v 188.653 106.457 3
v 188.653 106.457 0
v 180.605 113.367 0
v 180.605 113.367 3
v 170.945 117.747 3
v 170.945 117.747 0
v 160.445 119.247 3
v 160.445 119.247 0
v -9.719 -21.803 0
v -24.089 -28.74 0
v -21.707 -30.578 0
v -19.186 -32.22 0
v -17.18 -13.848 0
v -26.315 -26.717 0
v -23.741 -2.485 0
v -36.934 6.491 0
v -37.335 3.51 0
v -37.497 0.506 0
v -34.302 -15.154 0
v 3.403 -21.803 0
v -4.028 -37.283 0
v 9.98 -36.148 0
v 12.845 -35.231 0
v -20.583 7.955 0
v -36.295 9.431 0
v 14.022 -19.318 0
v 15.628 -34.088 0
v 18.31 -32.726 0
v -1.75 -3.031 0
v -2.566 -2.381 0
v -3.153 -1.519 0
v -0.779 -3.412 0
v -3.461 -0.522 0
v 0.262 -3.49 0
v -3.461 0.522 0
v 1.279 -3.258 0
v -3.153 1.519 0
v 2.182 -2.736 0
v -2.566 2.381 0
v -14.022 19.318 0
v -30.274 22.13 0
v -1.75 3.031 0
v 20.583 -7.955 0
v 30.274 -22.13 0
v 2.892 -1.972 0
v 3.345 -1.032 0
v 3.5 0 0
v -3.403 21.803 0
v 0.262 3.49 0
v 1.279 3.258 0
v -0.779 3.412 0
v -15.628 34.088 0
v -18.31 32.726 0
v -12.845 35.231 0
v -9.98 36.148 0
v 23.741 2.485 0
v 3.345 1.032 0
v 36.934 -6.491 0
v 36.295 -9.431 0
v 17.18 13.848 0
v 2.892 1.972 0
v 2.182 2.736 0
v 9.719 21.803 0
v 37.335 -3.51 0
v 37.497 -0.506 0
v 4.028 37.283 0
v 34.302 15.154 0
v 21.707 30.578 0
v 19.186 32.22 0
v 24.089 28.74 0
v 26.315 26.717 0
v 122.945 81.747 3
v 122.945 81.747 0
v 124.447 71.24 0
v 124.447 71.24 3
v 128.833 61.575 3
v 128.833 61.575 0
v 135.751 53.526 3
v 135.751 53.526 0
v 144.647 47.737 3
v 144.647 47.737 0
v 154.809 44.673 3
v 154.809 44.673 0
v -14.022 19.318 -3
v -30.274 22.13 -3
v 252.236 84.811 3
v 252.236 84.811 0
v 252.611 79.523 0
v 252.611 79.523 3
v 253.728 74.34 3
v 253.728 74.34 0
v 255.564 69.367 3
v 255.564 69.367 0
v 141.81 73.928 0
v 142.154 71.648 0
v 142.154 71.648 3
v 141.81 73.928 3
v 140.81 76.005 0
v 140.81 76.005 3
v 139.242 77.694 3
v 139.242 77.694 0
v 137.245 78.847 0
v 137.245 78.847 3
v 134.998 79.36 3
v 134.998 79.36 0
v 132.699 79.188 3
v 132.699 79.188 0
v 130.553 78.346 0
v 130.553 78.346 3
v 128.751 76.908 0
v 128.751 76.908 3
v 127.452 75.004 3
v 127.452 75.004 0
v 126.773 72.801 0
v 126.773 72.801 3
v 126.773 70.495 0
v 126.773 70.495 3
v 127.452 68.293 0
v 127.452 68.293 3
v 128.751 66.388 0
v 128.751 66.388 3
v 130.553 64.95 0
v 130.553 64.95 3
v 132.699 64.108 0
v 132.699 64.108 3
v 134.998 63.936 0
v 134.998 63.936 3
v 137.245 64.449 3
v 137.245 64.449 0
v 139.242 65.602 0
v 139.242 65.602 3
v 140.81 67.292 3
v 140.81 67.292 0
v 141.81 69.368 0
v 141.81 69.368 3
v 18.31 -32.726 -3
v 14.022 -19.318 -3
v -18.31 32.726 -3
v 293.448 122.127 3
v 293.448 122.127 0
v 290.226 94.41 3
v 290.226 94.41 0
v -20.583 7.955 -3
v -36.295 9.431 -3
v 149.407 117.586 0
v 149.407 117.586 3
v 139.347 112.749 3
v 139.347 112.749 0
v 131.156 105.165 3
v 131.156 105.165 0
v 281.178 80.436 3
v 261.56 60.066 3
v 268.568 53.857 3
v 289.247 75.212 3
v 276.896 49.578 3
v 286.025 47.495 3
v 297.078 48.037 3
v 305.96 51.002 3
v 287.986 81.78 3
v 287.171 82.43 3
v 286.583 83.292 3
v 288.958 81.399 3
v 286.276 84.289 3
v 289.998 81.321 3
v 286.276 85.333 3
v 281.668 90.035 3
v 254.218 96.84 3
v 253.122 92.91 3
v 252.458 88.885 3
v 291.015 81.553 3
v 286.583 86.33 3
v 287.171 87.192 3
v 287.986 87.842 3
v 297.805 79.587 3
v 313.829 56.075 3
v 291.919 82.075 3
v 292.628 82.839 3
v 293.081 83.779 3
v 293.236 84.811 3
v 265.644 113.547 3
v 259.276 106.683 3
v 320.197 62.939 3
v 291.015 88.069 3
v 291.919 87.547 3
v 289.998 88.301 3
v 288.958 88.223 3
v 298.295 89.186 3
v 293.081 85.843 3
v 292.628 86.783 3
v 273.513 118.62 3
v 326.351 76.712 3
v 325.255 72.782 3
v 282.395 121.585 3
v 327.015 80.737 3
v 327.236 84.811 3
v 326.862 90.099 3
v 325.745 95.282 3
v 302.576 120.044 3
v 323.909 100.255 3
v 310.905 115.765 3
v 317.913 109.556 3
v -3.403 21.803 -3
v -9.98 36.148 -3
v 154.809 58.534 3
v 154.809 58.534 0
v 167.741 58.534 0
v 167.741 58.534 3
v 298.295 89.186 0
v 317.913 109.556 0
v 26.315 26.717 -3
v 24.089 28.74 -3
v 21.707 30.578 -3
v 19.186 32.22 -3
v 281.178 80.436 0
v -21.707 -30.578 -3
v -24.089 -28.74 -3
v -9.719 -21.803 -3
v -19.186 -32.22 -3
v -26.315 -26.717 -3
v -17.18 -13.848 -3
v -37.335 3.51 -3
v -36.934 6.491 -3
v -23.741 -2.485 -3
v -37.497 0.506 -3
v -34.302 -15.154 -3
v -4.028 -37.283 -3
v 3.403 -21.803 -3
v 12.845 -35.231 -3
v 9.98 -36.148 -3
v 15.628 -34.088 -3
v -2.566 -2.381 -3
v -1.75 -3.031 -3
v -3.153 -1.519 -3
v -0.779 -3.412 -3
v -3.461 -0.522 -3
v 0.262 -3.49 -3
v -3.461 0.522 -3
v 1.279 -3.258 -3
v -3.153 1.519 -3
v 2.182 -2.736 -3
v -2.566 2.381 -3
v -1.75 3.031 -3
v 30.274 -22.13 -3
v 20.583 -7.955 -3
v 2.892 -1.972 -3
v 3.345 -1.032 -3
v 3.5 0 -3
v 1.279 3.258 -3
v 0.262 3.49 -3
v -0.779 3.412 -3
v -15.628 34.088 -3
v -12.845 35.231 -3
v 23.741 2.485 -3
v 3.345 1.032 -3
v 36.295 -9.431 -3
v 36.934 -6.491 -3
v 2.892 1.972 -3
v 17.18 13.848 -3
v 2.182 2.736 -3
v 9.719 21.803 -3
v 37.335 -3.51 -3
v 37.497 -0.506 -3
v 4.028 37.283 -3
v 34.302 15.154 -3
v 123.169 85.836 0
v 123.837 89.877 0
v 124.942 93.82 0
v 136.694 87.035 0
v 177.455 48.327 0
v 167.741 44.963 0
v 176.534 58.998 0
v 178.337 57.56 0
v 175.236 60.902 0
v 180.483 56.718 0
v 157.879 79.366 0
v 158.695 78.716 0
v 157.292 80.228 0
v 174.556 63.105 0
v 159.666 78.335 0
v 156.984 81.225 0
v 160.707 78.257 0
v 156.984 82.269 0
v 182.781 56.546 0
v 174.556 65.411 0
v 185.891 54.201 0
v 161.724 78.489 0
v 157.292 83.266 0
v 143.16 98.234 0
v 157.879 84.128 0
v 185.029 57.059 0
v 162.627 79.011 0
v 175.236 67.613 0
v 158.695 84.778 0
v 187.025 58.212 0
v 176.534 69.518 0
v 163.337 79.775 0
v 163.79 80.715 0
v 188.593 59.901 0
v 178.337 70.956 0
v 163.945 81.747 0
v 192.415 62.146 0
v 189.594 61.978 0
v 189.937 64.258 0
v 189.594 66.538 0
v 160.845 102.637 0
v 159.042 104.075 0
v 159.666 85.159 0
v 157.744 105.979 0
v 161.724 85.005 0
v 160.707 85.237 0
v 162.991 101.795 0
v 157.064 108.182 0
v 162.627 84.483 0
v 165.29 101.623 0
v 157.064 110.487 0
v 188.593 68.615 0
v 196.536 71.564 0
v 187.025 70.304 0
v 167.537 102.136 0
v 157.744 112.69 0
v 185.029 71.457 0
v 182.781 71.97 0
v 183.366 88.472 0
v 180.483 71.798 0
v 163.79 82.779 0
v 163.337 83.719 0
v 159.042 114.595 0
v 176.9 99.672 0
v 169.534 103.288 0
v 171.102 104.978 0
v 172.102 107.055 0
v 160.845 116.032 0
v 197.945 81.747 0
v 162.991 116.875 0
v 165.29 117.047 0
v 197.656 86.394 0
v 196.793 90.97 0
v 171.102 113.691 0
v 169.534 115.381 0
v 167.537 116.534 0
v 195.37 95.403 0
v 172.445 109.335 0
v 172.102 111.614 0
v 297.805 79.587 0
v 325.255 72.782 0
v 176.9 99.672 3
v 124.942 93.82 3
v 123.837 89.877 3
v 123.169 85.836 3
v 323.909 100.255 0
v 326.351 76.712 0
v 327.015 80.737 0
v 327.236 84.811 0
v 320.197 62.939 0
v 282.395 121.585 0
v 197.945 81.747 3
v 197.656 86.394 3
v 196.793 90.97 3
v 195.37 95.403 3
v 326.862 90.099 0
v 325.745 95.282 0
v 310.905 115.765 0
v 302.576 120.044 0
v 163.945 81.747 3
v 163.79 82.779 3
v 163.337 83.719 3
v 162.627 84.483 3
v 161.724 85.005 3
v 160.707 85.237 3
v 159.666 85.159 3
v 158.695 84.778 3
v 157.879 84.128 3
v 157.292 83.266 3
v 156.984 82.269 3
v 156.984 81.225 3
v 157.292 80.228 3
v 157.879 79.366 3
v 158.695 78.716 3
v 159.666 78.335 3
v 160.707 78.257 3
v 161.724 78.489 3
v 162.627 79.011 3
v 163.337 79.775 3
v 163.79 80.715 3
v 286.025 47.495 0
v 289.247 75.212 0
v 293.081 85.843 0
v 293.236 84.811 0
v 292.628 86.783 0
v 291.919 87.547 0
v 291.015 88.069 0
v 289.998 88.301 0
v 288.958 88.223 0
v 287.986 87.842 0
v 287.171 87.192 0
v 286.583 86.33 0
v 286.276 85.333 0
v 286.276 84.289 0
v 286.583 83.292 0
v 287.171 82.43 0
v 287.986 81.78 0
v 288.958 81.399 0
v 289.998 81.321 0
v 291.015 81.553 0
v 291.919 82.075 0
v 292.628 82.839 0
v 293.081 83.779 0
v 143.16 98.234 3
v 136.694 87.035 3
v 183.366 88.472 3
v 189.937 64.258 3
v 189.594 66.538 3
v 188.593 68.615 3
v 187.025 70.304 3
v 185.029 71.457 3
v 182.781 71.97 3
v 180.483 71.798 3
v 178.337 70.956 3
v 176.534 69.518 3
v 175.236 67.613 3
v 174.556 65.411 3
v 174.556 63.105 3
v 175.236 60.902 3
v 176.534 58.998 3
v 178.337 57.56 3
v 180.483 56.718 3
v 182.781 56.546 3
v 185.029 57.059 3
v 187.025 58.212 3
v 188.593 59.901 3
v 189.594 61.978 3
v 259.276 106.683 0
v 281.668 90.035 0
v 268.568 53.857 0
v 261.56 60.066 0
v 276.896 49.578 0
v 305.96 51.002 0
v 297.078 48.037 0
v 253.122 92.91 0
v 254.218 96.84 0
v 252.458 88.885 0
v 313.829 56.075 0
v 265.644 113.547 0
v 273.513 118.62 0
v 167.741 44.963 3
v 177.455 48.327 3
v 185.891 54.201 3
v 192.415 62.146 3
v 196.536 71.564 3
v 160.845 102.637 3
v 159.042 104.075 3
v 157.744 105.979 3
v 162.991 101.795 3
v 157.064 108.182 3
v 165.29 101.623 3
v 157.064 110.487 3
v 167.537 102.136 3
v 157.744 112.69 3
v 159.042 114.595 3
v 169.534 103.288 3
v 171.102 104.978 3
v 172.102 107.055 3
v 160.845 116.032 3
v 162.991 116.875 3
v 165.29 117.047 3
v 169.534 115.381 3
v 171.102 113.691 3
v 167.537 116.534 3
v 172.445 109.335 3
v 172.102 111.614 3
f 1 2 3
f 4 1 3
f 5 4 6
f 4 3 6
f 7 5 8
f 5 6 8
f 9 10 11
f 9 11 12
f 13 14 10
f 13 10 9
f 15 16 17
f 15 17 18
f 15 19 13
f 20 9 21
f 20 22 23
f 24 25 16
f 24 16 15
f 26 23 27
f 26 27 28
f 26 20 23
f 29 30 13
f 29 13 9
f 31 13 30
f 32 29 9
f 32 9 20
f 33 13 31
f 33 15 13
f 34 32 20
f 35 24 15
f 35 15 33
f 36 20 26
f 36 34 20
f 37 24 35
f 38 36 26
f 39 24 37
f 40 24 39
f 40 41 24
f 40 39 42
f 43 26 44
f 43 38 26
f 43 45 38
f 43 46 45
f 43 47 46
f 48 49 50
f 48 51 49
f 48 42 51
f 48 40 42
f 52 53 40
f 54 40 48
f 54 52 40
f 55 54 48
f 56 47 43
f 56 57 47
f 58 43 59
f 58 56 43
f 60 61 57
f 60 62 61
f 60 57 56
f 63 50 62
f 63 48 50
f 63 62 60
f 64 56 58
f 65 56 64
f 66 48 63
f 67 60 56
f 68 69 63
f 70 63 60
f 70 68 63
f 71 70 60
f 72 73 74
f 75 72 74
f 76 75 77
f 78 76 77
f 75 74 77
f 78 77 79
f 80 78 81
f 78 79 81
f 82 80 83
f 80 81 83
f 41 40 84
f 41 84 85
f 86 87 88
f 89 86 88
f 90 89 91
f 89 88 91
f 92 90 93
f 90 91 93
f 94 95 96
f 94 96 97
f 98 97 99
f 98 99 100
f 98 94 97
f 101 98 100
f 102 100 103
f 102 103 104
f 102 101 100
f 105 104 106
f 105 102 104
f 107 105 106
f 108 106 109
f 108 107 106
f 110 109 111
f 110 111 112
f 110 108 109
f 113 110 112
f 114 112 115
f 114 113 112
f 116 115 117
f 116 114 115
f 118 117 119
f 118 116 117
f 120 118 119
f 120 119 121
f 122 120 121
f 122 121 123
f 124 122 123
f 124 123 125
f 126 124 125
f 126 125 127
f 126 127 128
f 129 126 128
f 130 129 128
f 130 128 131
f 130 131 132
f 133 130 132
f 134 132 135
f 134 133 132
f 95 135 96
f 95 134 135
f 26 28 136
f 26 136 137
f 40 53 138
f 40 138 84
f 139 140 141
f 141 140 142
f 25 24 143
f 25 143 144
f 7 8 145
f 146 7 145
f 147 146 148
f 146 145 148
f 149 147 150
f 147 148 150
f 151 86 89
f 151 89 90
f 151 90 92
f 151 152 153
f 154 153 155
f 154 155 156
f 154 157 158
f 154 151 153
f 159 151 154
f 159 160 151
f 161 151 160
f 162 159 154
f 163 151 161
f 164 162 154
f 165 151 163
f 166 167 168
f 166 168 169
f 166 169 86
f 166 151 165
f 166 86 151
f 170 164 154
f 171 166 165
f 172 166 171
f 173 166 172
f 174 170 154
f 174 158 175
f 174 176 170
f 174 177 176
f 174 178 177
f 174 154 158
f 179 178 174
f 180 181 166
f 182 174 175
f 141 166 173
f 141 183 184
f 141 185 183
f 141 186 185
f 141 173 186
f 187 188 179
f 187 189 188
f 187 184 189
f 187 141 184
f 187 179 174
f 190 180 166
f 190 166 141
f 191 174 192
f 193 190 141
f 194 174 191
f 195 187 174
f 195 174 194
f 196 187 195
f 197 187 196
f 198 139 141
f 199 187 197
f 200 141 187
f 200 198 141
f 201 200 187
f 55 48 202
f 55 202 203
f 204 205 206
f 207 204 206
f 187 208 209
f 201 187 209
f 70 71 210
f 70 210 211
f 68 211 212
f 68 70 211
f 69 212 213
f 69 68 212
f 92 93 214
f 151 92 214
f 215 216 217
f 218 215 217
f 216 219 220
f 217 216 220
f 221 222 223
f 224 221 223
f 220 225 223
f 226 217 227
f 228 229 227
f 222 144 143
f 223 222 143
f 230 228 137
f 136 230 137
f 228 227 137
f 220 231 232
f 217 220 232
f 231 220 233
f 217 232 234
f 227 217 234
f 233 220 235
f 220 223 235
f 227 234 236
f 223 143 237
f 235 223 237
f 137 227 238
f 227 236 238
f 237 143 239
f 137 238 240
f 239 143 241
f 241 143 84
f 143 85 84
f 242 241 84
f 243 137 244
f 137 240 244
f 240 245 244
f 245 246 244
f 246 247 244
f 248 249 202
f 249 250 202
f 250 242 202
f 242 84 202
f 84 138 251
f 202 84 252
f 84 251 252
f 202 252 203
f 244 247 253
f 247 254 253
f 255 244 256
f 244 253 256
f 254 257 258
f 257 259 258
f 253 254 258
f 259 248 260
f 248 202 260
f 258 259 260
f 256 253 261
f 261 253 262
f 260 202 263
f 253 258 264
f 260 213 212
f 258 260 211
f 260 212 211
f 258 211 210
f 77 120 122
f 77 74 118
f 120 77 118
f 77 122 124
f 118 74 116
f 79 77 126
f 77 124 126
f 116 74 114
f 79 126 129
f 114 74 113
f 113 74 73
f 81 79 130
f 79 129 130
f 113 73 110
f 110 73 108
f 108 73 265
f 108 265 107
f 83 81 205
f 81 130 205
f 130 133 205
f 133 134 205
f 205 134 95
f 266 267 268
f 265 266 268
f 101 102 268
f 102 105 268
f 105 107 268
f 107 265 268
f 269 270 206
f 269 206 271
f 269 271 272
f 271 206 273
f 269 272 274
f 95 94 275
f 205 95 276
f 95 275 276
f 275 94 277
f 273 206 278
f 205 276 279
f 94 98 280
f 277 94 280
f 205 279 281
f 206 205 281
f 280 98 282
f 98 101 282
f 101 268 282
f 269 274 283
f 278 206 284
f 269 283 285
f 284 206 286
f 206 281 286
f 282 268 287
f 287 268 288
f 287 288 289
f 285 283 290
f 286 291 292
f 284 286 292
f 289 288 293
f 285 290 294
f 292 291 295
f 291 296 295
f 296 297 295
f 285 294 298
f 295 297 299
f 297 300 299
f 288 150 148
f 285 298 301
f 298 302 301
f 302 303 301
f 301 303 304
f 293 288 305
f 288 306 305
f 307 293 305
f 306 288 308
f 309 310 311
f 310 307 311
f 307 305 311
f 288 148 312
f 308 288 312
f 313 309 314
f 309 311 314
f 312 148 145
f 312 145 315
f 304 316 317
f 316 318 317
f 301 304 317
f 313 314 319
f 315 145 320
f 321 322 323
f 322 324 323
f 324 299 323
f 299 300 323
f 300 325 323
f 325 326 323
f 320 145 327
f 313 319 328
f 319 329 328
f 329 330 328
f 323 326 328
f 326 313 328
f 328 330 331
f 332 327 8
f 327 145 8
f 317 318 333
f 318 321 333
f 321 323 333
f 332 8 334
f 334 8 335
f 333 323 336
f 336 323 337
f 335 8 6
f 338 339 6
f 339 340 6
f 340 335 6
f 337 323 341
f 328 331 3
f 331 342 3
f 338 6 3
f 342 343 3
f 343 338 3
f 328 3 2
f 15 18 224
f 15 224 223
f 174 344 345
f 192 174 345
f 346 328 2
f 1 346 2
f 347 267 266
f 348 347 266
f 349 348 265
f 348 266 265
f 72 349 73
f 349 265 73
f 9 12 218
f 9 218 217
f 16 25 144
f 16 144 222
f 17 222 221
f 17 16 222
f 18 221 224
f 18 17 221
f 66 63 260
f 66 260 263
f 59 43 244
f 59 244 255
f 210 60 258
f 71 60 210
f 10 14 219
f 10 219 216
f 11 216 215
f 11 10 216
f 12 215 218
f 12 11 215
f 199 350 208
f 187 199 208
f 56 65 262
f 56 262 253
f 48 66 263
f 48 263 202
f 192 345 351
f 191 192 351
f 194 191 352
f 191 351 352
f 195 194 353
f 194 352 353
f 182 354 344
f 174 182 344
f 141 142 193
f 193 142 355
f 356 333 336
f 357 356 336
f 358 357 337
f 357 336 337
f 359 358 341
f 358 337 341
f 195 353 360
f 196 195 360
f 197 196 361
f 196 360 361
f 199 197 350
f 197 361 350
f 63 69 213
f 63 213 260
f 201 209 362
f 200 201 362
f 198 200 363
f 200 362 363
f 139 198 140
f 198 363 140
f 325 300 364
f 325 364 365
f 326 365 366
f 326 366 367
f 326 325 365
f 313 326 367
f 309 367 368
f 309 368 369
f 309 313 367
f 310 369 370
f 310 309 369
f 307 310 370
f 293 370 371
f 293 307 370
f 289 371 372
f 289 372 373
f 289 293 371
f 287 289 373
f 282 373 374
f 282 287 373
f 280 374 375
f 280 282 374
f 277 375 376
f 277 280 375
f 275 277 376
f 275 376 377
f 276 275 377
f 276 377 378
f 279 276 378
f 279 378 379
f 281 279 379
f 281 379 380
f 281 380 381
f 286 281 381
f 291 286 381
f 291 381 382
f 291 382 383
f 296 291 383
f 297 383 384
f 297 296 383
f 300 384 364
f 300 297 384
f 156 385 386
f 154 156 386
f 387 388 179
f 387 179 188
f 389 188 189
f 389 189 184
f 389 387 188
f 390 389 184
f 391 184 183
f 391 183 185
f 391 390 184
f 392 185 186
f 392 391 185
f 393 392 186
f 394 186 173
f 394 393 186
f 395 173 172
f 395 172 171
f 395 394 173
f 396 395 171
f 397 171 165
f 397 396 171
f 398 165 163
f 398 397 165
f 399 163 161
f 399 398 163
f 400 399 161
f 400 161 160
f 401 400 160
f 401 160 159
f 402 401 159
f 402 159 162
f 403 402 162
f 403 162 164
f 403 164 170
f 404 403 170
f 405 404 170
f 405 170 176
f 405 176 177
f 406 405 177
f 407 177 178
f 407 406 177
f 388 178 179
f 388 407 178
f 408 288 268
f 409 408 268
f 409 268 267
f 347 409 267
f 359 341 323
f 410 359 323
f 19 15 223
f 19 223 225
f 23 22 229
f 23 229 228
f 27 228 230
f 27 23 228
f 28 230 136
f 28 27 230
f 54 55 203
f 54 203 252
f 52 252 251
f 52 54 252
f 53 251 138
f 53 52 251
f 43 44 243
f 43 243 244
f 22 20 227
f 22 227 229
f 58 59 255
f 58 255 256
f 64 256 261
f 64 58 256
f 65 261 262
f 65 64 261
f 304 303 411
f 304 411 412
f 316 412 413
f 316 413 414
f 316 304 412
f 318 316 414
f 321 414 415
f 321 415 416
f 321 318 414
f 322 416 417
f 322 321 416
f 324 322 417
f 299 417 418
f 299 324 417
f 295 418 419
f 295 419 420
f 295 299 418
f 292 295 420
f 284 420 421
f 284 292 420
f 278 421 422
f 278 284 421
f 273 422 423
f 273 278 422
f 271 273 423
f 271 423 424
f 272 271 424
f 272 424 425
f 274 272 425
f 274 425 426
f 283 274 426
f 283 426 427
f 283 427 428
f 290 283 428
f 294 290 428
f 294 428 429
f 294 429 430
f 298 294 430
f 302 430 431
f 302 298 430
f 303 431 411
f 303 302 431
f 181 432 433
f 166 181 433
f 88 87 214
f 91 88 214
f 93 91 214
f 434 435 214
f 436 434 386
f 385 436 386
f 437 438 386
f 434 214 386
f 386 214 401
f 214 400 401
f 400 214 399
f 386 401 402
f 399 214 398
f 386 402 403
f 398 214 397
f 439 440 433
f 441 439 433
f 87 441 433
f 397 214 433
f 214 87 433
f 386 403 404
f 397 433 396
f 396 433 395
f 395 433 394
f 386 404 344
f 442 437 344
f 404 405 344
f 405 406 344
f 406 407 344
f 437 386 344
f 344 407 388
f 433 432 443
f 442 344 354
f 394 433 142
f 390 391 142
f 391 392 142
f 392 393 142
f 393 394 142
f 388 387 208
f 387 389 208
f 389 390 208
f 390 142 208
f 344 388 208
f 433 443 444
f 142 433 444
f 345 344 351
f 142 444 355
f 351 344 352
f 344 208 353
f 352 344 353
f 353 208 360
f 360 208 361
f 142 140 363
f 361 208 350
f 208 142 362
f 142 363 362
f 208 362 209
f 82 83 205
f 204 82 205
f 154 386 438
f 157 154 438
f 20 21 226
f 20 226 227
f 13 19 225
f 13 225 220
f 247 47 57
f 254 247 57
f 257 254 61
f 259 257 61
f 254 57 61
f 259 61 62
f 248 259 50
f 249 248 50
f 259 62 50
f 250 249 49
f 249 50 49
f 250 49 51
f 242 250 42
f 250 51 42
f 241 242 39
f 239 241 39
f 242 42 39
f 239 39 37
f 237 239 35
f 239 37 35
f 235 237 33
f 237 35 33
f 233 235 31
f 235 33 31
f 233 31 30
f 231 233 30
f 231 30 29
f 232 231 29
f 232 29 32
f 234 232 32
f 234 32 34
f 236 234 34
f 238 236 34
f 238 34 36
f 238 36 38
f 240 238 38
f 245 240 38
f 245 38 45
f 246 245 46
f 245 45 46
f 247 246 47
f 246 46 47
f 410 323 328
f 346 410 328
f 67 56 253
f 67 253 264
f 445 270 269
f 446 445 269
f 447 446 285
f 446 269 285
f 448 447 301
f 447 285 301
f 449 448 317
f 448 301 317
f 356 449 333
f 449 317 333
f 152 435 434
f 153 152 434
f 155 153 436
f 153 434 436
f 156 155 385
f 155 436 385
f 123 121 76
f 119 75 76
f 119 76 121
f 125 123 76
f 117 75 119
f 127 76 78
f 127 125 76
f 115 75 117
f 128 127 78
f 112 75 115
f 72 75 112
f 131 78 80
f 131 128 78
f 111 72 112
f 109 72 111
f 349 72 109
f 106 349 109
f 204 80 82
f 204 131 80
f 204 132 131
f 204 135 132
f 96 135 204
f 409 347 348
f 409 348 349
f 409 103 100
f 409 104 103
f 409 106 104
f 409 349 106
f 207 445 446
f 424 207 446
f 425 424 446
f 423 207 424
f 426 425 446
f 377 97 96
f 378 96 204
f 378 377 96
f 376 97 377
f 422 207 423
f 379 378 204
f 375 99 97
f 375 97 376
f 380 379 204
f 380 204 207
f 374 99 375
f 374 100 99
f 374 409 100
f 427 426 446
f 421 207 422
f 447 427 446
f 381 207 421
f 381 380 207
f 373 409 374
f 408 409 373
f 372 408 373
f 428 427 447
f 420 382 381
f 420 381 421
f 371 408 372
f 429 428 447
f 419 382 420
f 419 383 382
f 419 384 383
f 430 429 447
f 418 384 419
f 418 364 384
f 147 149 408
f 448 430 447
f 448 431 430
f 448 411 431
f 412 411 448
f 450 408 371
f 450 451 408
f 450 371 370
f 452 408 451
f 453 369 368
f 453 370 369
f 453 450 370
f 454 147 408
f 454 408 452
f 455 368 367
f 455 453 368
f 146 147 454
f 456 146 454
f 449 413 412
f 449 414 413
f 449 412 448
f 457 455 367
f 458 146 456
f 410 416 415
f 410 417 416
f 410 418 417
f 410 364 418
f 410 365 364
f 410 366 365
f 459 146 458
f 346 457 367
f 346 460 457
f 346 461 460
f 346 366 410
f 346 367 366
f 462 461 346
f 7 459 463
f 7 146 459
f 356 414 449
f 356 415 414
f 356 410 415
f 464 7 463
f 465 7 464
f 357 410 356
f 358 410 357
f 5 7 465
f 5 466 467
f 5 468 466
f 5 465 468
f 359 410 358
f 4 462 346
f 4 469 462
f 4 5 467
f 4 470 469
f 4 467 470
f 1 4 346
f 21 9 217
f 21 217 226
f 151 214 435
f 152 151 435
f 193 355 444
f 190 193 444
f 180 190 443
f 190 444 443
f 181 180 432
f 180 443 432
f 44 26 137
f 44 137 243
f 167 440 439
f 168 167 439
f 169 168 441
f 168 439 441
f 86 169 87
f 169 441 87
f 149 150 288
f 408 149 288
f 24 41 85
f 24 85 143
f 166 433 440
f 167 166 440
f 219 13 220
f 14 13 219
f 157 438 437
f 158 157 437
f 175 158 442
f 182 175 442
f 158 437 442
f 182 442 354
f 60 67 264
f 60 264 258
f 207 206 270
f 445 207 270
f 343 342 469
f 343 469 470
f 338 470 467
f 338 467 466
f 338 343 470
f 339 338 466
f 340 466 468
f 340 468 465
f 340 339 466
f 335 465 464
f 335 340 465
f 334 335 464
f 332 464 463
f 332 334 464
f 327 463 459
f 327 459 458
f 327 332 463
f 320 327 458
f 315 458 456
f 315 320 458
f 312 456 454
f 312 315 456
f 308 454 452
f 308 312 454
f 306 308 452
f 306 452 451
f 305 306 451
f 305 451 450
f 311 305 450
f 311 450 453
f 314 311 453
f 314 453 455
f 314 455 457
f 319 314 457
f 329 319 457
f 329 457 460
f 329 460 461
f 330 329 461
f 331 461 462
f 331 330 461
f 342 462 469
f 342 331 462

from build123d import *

# Parameters (mm, degrees)
F0_R     = 3.5
F1_DEPTH = 3
F2_R     = 7.733671
F2_R_2   = 3.5
F3_DEPTH = 3
F4_R     = 3.5
F5_DEPTH = 3


with BuildPart() as f1:
    # F0 (on Top) → F1 (new body)
    with BuildSketch(Plane.XY):
        with BuildLine():
            Line((-9.718686, -21.802576), (-4.02755, -37.283091))
            Line((-4.02755, -37.283091), (3.402607, -21.802576))
            Line((3.402607, -21.802576), (9.979824, -36.147657))
            ThreePointArc((9.979824, -36.147657), (14.248099, -34.687774), (18.310194, -32.725935))
            Line((18.310194, -32.725935), (14.022242, -19.317917))
            Line((14.022242, -19.317917), (30.274328, -22.129506))
            Line((30.274328, -22.129506), (20.582888, -7.954544))
            Line((20.582888, -7.954544), (36.294701, -9.431048))
            ThreePointArc((36.294701, -9.431048), (37.164543, -5.004672), (37.496588, -0.505875))
            Line((37.496588, -0.505875), (23.740928, 2.484659))
            Line((23.740928, 2.484659), (34.301879, 15.153584))
            Line((34.301879, 15.153584), (17.180281, 13.848032))
            Line((17.180281, 13.848032), (26.314878, 26.716609))
            ThreePointArc((26.314878, 26.716609), (22.916444, 29.683102), (19.186394, 32.22006))
            Line((19.186394, 32.22006), (9.718686, 21.802576))
            Line((9.718686, 21.802576), (4.02755, 37.283091))
            Line((4.02755, 37.283091), (-3.402607, 21.802576))
            Line((-3.402607, 21.802576), (-9.979824, 36.147657))
            ThreePointArc((-9.979824, 36.147657), (-14.248099, 34.687774), (-18.310194, 32.725935))
            Line((-18.310194, 32.725935), (-14.022242, 19.317917))
            Line((-14.022242, 19.317917), (-30.274328, 22.129506))
            Line((-30.274328, 22.129506), (-20.582888, 7.954544))
            Line((-20.582888, 7.954544), (-36.294701, 9.431048))
            ThreePointArc((-36.294701, 9.431048), (-37.164543, 5.004672), (-37.496588, 0.505875))
            Line((-37.496588, 0.505875), (-23.740928, -2.484659))
            Line((-23.740928, -2.484659), (-34.301879, -15.153584))
            Line((-34.301879, -15.153584), (-17.180281, -13.848032))
            Line((-17.180281, -13.848032), (-26.314878, -26.716609))
            ThreePointArc((-26.314878, -26.716609), (-22.916444, -29.683102), (-19.186394, -32.22006))
            Line((-19.186394, -32.22006), (-9.718686, -21.802576))
        make_face()
        Circle(F0_R, mode=Mode.SUBTRACT)
    extrude(amount=-F1_DEPTH)


with BuildPart() as f3:
    # F2 (on Top) → F3 (new body)
    with BuildSketch(Plane.XY):
        with BuildLine():
            ThreePointArc((124.941746, 93.820376), (123.447566, 87.865658), (122.945017, 81.746943))
            ThreePointArc((122.945017, 81.746943), (132.005552, 57.304217), (154.808849, 44.672914))
            Line((154.808849, 44.672914), (154.808849, 58.534061))
            Line((154.808849, 58.534061), (167.740753, 58.534061))
            Line((167.740753, 58.534061), (167.740753, 44.963493))
            ThreePointArc((167.740753, 44.963493), (189.426391, 57.949255), (197.945017, 81.746943))
            ThreePointArc((197.945017, 81.746943), (197.295678, 88.695233), (195.370151, 95.402893))
            Line((195.370151, 95.402893), (183.366047, 88.47232))
            Line((183.366047, 88.47232), (176.900095, 99.671678))
            Line((176.900095, 99.671678), (188.652551, 106.456962))
            ThreePointArc((188.652551, 106.456962), (175.930886, 115.900096), (160.445017, 119.246943))
            ThreePointArc((160.445017, 119.246943), (144.195831, 115.5436), (131.15605, 105.165022))
            Line((131.15605, 105.165022), (143.160154, 98.234449))
            Line((143.160154, 98.234449), (136.694202, 87.035092))
            Line((136.694202, 87.035092), (124.941746, 93.820376))
        make_face()
        with Locations((134.419895, 71.648038)):
            Circle(F2_R, mode=Mode.SUBTRACT)
        with Locations((160.445017, 81.746943)):
            Circle(F2_R_2, mode=Mode.SUBTRACT)
        with Locations((182.203487, 64.257979)):
            Circle(F2_R, mode=Mode.SUBTRACT)
        with Locations((164.711669, 109.334813)):
            Circle(F2_R, mode=Mode.SUBTRACT)
    extrude(amount=F3_DEPTH)


with BuildPart() as f5:
    # F4 (on Top) → F5 (new body)
    with BuildSketch(Plane.XY):
        with BuildLine():
            ThreePointArc((254.2181, 96.839968), (252.735201, 90.906578), (252.23648, 84.811056))
            ThreePointArc((252.23648, 84.811056), (253.077866, 76.911941), (255.564268, 69.36729))
            Line((255.564268, 69.36729), (281.178402, 80.435794))
            Line((281.178402, 80.435794), (261.559947, 60.065693))
            ThreePointArc((261.559947, 60.065693), (272.598371, 51.456368), (286.025068, 47.495169))
            Line((286.025068, 47.495169), (289.246529, 75.211912))
            Line((289.246529, 75.211912), (297.078326, 48.036781))
            ThreePointArc((297.078326, 48.036781), (310.053433, 53.291675), (320.19728, 62.938936))
            Line((320.19728, 62.938936), (297.804607, 79.587175))
            Line((297.804607, 79.587175), (325.254859, 72.782145))
            ThreePointArc((325.254859, 72.782145), (326.737758, 78.715535), (327.23648, 84.811056))
            ThreePointArc((327.23648, 84.811056), (326.395093, 92.710172), (323.908691, 100.254823))
            Line((323.908691, 100.254823), (298.294557, 89.186319))
            Line((298.294557, 89.186319), (317.913012, 109.556419))
            ThreePointArc((317.913012, 109.556419), (306.874588, 118.165745), (293.447891, 122.126943))
            Line((293.447891, 122.126943), (290.22643, 94.4102))
            Line((290.22643, 94.4102), (282.394633, 121.585331))
            ThreePointArc((282.394633, 121.585331), (269.419526, 116.330438), (259.275679, 106.683177))
            Line((259.275679, 106.683177), (281.668352, 90.034937))
            Line((281.668352, 90.034937), (254.2181, 96.839968))
        make_face()
        with Locations((289.73648, 84.811056)):
            Circle(F4_R, mode=Mode.SUBTRACT)
    extrude(amount=F5_DEPTH)


solid = Compound([f1.part, f3.part, f5.part])
